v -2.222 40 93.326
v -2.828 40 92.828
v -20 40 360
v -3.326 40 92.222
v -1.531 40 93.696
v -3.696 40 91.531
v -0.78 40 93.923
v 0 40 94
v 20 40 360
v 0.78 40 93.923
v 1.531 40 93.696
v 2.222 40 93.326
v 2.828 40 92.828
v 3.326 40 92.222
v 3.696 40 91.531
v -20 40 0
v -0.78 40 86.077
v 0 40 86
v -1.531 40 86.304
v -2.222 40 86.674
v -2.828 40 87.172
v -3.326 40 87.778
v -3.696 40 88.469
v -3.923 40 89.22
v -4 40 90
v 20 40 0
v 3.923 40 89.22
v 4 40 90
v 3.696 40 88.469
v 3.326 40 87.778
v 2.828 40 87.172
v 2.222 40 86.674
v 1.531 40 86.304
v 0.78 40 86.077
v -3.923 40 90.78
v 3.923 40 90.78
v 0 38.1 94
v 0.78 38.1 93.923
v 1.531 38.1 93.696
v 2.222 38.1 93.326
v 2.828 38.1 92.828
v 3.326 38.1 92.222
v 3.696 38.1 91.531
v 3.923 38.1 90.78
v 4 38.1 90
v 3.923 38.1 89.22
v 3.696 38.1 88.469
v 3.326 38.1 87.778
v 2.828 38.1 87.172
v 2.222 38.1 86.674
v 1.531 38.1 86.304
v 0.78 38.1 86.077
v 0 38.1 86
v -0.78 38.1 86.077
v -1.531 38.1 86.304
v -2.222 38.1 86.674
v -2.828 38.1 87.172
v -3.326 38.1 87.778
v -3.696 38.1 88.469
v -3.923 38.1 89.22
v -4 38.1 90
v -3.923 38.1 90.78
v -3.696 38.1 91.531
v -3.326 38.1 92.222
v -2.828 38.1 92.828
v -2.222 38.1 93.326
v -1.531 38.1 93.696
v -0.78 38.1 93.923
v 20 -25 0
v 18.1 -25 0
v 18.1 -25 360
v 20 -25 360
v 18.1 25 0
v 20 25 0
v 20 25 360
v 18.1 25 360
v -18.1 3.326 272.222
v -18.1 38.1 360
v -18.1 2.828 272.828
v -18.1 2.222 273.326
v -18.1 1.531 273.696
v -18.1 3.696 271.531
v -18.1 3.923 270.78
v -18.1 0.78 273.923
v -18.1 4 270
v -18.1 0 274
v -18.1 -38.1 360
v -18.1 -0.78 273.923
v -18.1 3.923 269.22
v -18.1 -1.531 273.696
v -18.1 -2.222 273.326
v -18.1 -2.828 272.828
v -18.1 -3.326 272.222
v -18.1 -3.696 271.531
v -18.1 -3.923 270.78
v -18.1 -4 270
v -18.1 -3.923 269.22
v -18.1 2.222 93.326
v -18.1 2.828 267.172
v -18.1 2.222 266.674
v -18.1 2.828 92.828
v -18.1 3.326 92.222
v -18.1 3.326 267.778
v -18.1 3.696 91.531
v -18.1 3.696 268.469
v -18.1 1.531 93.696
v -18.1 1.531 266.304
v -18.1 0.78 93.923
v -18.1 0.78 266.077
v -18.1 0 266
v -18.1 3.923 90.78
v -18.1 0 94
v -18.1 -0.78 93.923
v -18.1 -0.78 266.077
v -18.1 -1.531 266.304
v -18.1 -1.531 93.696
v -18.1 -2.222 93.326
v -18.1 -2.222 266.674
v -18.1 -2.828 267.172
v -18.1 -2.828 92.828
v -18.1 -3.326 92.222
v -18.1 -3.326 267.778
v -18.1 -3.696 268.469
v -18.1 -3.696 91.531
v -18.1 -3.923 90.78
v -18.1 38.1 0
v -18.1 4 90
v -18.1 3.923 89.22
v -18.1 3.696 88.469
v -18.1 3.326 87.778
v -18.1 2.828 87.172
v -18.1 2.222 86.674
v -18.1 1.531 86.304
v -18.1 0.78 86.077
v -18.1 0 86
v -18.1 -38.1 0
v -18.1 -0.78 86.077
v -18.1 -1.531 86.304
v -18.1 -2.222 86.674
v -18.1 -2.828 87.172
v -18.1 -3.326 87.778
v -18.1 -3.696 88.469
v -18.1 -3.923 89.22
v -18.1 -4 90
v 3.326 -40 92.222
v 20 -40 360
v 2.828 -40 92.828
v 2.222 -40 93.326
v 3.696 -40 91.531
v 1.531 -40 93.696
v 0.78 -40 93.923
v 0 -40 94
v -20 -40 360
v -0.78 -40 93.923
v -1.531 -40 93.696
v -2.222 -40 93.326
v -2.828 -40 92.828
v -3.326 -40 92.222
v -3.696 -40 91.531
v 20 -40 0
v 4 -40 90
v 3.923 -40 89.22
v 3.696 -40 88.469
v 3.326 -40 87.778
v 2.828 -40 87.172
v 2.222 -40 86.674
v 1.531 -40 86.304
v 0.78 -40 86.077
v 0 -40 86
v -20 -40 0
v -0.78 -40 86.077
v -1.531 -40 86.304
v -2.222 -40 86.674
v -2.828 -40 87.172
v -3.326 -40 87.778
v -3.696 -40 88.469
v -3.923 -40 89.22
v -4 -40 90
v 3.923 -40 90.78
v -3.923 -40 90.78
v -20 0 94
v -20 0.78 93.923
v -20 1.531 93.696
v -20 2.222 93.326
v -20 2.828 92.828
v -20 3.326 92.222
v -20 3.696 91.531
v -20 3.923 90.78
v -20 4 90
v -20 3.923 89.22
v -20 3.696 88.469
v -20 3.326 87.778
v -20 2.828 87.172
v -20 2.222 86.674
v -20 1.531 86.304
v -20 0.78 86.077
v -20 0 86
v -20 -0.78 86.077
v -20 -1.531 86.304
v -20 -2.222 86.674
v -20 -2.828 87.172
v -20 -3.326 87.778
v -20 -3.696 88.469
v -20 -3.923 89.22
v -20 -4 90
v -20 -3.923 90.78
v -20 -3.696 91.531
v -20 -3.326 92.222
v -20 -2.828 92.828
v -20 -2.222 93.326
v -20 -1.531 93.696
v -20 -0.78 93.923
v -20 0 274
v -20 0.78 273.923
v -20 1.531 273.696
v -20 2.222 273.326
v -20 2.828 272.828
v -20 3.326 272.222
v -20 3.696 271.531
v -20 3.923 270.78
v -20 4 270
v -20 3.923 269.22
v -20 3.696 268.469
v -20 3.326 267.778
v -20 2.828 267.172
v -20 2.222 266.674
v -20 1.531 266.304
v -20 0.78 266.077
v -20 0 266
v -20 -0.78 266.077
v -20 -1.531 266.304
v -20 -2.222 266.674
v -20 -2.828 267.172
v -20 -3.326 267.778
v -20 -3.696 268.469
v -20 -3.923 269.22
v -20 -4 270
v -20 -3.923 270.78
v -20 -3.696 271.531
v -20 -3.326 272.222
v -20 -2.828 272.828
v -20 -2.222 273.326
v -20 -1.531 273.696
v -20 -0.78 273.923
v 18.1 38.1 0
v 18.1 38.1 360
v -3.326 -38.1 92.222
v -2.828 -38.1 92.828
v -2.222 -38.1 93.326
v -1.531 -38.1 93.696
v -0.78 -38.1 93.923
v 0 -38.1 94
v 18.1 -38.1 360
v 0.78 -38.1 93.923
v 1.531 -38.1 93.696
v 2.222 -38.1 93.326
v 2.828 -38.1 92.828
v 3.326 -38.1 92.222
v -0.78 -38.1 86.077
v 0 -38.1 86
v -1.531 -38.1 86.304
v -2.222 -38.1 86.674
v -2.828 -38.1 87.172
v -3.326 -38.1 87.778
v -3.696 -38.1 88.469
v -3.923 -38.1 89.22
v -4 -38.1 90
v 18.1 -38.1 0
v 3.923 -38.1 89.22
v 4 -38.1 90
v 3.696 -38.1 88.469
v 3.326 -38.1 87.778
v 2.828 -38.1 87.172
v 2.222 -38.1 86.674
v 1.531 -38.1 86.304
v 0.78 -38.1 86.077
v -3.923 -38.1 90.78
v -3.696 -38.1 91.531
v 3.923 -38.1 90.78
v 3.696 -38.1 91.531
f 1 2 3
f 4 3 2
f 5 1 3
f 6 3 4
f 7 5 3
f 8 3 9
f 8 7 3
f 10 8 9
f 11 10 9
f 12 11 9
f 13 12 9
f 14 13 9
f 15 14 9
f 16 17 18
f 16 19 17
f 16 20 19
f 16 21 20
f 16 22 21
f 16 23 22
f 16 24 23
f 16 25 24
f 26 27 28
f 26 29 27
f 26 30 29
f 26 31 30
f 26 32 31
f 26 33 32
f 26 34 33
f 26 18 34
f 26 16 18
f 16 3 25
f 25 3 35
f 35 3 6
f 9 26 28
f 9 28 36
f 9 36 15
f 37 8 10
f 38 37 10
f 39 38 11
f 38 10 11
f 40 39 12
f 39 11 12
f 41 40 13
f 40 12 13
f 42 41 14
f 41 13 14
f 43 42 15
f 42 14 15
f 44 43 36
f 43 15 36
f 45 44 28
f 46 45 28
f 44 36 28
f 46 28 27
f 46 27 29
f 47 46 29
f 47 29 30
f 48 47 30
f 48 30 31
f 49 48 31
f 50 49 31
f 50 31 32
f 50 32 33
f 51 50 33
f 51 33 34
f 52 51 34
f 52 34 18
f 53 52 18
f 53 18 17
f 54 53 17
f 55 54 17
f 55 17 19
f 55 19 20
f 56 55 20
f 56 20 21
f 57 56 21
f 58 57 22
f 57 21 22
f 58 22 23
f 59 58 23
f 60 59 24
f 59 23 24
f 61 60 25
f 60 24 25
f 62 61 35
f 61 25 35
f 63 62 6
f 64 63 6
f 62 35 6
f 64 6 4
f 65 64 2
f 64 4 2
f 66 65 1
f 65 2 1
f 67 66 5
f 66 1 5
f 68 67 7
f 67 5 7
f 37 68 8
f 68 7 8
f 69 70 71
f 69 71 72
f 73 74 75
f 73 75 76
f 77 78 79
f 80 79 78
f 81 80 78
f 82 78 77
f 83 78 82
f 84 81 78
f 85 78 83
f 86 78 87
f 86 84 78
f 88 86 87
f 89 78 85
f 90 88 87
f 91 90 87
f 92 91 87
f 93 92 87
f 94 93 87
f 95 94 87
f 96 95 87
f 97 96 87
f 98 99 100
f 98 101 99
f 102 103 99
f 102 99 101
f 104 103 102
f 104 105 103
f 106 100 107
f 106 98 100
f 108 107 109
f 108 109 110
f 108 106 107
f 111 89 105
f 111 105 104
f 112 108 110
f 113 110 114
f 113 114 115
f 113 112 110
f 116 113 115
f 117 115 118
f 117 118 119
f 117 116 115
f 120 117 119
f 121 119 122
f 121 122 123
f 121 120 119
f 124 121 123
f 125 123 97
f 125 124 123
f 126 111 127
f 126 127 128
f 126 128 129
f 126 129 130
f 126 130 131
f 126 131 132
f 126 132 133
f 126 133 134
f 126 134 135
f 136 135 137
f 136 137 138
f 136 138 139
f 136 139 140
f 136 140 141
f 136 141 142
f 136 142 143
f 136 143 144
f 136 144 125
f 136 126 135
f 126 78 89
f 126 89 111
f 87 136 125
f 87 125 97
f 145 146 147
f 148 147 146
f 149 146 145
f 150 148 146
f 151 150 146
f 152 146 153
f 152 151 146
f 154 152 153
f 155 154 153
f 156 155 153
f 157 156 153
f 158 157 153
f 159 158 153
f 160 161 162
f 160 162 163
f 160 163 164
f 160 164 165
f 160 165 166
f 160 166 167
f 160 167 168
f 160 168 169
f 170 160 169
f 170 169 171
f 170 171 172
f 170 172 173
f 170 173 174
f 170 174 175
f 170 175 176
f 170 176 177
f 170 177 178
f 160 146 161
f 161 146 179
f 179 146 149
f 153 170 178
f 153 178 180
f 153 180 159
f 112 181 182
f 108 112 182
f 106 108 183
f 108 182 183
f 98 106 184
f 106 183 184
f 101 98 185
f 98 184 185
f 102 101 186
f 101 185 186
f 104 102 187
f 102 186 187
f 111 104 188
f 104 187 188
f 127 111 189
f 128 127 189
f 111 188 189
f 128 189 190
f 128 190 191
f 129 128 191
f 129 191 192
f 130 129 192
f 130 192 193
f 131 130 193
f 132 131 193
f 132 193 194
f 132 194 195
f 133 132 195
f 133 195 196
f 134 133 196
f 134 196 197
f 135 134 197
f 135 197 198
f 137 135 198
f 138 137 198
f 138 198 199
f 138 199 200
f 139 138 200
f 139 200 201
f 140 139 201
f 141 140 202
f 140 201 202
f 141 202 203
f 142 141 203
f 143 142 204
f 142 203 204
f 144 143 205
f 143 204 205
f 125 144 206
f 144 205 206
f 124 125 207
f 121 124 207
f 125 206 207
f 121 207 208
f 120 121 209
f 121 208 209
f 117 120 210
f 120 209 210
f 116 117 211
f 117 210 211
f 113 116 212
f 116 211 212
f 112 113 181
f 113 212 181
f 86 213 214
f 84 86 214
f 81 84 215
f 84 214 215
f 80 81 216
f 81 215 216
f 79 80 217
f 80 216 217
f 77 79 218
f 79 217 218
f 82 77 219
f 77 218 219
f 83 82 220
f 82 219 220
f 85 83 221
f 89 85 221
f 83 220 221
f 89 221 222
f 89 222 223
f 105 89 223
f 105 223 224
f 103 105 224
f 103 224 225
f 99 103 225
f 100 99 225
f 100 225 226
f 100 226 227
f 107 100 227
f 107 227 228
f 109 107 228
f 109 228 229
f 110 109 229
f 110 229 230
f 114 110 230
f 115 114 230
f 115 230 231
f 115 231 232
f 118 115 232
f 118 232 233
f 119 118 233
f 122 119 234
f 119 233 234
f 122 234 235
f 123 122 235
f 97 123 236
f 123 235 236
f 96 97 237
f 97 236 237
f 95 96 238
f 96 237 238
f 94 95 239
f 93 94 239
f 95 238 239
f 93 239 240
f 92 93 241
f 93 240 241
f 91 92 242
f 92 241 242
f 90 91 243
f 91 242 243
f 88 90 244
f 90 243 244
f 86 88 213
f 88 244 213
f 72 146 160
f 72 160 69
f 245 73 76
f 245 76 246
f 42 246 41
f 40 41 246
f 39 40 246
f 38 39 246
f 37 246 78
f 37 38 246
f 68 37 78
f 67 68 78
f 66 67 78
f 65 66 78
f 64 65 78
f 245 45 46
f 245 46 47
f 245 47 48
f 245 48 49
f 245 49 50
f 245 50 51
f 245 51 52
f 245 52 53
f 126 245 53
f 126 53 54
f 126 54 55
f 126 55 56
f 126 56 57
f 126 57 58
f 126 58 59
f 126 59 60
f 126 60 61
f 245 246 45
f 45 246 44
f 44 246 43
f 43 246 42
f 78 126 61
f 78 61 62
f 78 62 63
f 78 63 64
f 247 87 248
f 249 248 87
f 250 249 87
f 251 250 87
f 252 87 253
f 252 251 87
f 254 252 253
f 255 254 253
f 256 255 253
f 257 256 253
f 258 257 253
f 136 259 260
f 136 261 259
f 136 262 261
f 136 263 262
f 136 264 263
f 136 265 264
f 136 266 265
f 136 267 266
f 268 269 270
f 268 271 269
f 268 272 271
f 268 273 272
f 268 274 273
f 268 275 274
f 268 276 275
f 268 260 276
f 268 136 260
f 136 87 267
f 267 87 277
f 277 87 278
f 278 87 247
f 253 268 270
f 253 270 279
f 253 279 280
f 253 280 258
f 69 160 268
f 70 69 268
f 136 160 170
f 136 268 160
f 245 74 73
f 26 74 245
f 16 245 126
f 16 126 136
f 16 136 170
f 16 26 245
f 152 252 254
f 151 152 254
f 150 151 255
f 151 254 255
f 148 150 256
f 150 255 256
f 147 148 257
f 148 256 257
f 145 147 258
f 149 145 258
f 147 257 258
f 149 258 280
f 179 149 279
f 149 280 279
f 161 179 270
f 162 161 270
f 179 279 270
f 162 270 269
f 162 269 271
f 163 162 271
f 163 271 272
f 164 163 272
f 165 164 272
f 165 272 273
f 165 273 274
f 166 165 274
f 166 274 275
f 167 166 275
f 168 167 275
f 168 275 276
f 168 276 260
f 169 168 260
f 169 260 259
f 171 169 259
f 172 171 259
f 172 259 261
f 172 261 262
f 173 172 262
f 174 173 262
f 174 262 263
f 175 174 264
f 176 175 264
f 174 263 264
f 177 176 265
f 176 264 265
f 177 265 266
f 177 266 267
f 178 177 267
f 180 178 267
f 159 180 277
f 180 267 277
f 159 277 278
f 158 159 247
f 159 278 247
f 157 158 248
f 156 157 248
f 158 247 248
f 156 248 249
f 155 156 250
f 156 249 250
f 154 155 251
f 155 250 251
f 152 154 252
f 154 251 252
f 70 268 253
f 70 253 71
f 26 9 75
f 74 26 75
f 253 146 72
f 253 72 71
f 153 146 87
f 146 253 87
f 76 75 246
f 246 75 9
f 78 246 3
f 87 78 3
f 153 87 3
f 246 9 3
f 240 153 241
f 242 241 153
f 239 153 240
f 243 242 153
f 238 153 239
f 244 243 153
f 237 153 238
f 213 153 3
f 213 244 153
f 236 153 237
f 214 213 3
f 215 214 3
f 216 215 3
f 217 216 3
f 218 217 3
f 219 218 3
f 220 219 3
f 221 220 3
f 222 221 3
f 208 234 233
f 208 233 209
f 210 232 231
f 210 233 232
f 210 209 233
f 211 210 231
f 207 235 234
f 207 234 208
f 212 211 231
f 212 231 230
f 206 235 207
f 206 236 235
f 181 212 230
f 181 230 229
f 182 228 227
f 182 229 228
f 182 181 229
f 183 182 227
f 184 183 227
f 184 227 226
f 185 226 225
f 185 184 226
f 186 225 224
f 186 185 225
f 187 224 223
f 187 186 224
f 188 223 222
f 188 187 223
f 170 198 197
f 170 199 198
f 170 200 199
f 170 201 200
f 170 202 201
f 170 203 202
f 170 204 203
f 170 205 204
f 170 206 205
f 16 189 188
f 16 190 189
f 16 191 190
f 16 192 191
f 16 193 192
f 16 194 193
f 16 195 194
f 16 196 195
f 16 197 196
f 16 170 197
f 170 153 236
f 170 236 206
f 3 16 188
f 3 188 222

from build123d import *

# Parameters (mm, degrees)
SALIENTE_EXTRUIR1_DEPTH = 360
CROQUIS2_R              = 4
CORTAR_EXTRUIR1_DEPTH   = 365.417343166
CROQUIS3_R              = 4
CORTAR_EXTRUIR2_DEPTH   = 370.323706252


with BuildPart() as part:
    # Croquis1 → Saliente-Extruir1 (new body)
    with BuildSketch(Plane.XY):
        Polygon((18.1, -38.1), (18.1, -25), (20, -25), (20, -38.1), (20, -40), (-20, -40), (-20, 40), (20, 40), (20, 25), (18.1, 25), (18.1, 38.1), (-18.1, 38.1), (-18.1, -38.1), align=None)
    extrude(amount=SALIENTE_EXTRUIR1_DEPTH)

    # Croquis2 → Cortar-Extruir1 (cut, through all)
    with BuildSketch(Plane.ZY.offset(20)):
        with Locations((270, 0)):
            Circle(CROQUIS2_R)
        with Locations((90, 0)):
            Circle(CROQUIS2_R)
    extrude(amount=-CORTAR_EXTRUIR1_DEPTH, mode=Mode.SUBTRACT)

    # Croquis3 → Cortar-Extruir2 (cut, through all)
    with BuildSketch(Plane(origin=(0, 40, 0), x_dir=(1, 0, 0), z_dir=(0, 1, 0))):
        with Locations(Location((0, -90, 0), (0, 0, 270))):
            Circle(CROQUIS3_R)
    extrude(amount=-CORTAR_EXTRUIR2_DEPTH, mode=Mode.SUBTRACT)


solid = part.part
